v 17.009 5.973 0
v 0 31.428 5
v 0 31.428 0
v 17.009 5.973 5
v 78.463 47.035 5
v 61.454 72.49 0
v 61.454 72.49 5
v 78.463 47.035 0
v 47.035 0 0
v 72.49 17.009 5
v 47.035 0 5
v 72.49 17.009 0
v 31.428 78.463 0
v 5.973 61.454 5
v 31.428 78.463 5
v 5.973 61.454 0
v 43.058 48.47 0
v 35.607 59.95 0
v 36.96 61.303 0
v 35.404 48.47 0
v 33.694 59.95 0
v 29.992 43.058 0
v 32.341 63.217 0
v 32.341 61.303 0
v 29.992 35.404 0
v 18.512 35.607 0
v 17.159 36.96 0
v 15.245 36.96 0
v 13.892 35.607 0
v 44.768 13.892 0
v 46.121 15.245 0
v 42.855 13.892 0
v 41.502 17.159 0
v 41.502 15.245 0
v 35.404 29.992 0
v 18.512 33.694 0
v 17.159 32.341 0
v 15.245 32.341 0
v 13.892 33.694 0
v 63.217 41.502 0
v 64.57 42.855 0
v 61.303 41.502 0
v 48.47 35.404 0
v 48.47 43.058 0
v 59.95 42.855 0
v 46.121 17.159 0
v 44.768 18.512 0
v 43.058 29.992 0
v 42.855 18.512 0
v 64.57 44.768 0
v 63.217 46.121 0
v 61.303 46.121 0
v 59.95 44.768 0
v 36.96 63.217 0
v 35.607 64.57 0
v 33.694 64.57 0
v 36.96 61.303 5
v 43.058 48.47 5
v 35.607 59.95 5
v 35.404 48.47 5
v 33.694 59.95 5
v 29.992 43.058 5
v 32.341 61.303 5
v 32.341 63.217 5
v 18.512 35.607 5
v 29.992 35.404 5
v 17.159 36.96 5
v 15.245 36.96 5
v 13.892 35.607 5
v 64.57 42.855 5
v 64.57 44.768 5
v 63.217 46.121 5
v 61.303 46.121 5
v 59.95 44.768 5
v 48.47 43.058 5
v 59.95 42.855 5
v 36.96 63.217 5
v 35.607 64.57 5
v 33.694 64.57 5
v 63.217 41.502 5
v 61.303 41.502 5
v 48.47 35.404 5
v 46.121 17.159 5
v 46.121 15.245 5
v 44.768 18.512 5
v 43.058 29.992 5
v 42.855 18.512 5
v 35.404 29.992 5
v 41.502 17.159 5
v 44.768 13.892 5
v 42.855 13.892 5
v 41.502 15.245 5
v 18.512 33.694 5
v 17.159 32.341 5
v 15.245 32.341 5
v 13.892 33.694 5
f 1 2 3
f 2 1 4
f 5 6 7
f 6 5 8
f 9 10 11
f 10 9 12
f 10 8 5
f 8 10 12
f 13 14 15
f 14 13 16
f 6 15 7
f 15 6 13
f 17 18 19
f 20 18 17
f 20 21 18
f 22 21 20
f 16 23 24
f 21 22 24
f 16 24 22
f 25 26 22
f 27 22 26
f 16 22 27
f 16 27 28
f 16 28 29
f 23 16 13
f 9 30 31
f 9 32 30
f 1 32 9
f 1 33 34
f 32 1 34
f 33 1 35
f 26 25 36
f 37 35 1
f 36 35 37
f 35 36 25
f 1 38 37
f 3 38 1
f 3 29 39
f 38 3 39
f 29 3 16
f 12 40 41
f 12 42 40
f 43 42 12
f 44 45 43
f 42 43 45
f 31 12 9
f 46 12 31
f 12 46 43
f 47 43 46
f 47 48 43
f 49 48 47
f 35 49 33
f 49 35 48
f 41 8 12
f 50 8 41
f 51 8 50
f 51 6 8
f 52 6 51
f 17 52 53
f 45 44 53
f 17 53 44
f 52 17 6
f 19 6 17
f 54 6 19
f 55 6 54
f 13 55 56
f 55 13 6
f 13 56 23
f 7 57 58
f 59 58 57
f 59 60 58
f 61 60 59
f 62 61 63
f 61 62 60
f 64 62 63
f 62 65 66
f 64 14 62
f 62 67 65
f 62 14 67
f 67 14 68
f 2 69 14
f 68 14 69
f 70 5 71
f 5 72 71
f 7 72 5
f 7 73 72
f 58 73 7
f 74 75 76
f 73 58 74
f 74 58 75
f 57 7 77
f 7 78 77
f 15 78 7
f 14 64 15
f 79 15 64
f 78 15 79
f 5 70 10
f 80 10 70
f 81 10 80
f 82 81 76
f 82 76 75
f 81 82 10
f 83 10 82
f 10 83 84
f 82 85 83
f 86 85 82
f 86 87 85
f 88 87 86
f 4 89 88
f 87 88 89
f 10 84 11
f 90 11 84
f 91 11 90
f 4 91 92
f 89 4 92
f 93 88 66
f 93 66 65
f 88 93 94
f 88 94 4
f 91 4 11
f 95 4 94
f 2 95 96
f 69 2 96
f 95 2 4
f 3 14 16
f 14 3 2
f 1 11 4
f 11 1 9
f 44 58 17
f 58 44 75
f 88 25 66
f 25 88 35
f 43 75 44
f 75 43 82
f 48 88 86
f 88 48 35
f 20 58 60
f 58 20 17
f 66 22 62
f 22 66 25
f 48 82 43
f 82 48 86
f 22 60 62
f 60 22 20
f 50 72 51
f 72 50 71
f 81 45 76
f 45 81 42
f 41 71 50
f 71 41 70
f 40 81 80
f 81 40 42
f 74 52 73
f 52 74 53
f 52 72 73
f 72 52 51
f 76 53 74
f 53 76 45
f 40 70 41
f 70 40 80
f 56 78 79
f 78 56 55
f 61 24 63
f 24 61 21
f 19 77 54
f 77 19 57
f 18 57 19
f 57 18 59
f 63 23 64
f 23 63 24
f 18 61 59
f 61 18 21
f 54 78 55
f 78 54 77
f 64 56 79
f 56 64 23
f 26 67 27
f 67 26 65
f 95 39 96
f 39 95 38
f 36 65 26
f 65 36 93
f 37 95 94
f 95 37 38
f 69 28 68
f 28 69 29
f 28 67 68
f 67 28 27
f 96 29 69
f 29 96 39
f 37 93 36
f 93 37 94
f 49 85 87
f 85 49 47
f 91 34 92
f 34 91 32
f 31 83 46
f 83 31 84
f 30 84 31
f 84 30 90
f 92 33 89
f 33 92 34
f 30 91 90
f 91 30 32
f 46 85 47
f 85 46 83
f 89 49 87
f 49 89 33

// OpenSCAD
$fn = 32;

// ----------------------------------------------------------------------
// Polygon plate: 8-gon R40, 4 bolt windows
// ----------------------------------------------------------------------

// --- parameters (mm) ---
sides = 8;                // number of polygon sides
plate_r = 40;             // circumscribed radius of the polygon
bore_r = 10;              // centre bore radius
bolts = 4;                // number of bolt windows
ring_r = 23.48;           // bolt-circle radius
bolt_r = 2.5;             // bolt window radius
plate_t = 5;              // plate thickness, Z (extrusion height)
fit_tol = 0.02;           // declared fit tolerance (prompt contract)
free_tol = 0.2;           // declared free tolerance (prompt contract)

plate_d = 2 * plate_r;  // circumscribed diameter
bore_d = 2 * bore_r;  // centre bore diameter
bolt_d = 2 * bolt_r;  // bolt window diameter
ring_d = 2 * ring_r;  // bolt-circle diameter

profile = [[78.463, 47.035], [61.454, 72.49], [31.428, 78.463], [5.973, 61.454], [0, 31.428], [17.009, 5.973], [47.035, 0], [72.49, 17.009]];  // primary outline, 8 points, counter clockwise
void_1 = [[48.47, 43.058], [43.058, 48.47], [35.404, 48.47], [29.992, 43.058], [29.992, 35.404], [35.404, 29.992], [43.058, 29.992], [48.47, 35.404]];  // centre bore, 8 points
void_2 = [[64.57, 44.768], [63.217, 46.121], [61.303, 46.121], [59.95, 44.768], [59.95, 42.855], [61.303, 41.502], [63.217, 41.502], [64.57, 42.855]];  // bolt window 1, 8 points
void_3 = [[36.96, 63.217], [35.607, 64.57], [33.694, 64.57], [32.341, 63.217], [32.341, 61.303], [33.694, 59.95], [35.607, 59.95], [36.96, 61.303]];  // bolt window 2, 8 points
void_4 = [[18.512, 35.607], [17.159, 36.96], [15.245, 36.96], [13.892, 35.607], [13.892, 33.694], [15.245, 32.341], [17.159, 32.341], [18.512, 33.694]];  // bolt window 3, 8 points
void_5 = [[46.121, 17.159], [44.768, 18.512], [42.855, 18.512], [41.502, 17.159], [41.502, 15.245], [42.855, 13.892], [44.768, 13.892], [46.121, 15.245]];  // bolt window 4, 8 points

// --- the one profile operation ---
difference() {
  linear_extrude(height = plate_t) polygon(points = profile);
  translate([0, 0, -1])
    linear_extrude(height = plate_t + 2) polygon(points = void_1);
  translate([0, 0, -1])
    linear_extrude(height = plate_t + 2) polygon(points = void_2);
  translate([0, 0, -1])
    linear_extrude(height = plate_t + 2) polygon(points = void_3);
  translate([0, 0, -1])
    linear_extrude(height = plate_t + 2) polygon(points = void_4);
  translate([0, 0, -1])
    linear_extrude(height = plate_t + 2) polygon(points = void_5);
}
